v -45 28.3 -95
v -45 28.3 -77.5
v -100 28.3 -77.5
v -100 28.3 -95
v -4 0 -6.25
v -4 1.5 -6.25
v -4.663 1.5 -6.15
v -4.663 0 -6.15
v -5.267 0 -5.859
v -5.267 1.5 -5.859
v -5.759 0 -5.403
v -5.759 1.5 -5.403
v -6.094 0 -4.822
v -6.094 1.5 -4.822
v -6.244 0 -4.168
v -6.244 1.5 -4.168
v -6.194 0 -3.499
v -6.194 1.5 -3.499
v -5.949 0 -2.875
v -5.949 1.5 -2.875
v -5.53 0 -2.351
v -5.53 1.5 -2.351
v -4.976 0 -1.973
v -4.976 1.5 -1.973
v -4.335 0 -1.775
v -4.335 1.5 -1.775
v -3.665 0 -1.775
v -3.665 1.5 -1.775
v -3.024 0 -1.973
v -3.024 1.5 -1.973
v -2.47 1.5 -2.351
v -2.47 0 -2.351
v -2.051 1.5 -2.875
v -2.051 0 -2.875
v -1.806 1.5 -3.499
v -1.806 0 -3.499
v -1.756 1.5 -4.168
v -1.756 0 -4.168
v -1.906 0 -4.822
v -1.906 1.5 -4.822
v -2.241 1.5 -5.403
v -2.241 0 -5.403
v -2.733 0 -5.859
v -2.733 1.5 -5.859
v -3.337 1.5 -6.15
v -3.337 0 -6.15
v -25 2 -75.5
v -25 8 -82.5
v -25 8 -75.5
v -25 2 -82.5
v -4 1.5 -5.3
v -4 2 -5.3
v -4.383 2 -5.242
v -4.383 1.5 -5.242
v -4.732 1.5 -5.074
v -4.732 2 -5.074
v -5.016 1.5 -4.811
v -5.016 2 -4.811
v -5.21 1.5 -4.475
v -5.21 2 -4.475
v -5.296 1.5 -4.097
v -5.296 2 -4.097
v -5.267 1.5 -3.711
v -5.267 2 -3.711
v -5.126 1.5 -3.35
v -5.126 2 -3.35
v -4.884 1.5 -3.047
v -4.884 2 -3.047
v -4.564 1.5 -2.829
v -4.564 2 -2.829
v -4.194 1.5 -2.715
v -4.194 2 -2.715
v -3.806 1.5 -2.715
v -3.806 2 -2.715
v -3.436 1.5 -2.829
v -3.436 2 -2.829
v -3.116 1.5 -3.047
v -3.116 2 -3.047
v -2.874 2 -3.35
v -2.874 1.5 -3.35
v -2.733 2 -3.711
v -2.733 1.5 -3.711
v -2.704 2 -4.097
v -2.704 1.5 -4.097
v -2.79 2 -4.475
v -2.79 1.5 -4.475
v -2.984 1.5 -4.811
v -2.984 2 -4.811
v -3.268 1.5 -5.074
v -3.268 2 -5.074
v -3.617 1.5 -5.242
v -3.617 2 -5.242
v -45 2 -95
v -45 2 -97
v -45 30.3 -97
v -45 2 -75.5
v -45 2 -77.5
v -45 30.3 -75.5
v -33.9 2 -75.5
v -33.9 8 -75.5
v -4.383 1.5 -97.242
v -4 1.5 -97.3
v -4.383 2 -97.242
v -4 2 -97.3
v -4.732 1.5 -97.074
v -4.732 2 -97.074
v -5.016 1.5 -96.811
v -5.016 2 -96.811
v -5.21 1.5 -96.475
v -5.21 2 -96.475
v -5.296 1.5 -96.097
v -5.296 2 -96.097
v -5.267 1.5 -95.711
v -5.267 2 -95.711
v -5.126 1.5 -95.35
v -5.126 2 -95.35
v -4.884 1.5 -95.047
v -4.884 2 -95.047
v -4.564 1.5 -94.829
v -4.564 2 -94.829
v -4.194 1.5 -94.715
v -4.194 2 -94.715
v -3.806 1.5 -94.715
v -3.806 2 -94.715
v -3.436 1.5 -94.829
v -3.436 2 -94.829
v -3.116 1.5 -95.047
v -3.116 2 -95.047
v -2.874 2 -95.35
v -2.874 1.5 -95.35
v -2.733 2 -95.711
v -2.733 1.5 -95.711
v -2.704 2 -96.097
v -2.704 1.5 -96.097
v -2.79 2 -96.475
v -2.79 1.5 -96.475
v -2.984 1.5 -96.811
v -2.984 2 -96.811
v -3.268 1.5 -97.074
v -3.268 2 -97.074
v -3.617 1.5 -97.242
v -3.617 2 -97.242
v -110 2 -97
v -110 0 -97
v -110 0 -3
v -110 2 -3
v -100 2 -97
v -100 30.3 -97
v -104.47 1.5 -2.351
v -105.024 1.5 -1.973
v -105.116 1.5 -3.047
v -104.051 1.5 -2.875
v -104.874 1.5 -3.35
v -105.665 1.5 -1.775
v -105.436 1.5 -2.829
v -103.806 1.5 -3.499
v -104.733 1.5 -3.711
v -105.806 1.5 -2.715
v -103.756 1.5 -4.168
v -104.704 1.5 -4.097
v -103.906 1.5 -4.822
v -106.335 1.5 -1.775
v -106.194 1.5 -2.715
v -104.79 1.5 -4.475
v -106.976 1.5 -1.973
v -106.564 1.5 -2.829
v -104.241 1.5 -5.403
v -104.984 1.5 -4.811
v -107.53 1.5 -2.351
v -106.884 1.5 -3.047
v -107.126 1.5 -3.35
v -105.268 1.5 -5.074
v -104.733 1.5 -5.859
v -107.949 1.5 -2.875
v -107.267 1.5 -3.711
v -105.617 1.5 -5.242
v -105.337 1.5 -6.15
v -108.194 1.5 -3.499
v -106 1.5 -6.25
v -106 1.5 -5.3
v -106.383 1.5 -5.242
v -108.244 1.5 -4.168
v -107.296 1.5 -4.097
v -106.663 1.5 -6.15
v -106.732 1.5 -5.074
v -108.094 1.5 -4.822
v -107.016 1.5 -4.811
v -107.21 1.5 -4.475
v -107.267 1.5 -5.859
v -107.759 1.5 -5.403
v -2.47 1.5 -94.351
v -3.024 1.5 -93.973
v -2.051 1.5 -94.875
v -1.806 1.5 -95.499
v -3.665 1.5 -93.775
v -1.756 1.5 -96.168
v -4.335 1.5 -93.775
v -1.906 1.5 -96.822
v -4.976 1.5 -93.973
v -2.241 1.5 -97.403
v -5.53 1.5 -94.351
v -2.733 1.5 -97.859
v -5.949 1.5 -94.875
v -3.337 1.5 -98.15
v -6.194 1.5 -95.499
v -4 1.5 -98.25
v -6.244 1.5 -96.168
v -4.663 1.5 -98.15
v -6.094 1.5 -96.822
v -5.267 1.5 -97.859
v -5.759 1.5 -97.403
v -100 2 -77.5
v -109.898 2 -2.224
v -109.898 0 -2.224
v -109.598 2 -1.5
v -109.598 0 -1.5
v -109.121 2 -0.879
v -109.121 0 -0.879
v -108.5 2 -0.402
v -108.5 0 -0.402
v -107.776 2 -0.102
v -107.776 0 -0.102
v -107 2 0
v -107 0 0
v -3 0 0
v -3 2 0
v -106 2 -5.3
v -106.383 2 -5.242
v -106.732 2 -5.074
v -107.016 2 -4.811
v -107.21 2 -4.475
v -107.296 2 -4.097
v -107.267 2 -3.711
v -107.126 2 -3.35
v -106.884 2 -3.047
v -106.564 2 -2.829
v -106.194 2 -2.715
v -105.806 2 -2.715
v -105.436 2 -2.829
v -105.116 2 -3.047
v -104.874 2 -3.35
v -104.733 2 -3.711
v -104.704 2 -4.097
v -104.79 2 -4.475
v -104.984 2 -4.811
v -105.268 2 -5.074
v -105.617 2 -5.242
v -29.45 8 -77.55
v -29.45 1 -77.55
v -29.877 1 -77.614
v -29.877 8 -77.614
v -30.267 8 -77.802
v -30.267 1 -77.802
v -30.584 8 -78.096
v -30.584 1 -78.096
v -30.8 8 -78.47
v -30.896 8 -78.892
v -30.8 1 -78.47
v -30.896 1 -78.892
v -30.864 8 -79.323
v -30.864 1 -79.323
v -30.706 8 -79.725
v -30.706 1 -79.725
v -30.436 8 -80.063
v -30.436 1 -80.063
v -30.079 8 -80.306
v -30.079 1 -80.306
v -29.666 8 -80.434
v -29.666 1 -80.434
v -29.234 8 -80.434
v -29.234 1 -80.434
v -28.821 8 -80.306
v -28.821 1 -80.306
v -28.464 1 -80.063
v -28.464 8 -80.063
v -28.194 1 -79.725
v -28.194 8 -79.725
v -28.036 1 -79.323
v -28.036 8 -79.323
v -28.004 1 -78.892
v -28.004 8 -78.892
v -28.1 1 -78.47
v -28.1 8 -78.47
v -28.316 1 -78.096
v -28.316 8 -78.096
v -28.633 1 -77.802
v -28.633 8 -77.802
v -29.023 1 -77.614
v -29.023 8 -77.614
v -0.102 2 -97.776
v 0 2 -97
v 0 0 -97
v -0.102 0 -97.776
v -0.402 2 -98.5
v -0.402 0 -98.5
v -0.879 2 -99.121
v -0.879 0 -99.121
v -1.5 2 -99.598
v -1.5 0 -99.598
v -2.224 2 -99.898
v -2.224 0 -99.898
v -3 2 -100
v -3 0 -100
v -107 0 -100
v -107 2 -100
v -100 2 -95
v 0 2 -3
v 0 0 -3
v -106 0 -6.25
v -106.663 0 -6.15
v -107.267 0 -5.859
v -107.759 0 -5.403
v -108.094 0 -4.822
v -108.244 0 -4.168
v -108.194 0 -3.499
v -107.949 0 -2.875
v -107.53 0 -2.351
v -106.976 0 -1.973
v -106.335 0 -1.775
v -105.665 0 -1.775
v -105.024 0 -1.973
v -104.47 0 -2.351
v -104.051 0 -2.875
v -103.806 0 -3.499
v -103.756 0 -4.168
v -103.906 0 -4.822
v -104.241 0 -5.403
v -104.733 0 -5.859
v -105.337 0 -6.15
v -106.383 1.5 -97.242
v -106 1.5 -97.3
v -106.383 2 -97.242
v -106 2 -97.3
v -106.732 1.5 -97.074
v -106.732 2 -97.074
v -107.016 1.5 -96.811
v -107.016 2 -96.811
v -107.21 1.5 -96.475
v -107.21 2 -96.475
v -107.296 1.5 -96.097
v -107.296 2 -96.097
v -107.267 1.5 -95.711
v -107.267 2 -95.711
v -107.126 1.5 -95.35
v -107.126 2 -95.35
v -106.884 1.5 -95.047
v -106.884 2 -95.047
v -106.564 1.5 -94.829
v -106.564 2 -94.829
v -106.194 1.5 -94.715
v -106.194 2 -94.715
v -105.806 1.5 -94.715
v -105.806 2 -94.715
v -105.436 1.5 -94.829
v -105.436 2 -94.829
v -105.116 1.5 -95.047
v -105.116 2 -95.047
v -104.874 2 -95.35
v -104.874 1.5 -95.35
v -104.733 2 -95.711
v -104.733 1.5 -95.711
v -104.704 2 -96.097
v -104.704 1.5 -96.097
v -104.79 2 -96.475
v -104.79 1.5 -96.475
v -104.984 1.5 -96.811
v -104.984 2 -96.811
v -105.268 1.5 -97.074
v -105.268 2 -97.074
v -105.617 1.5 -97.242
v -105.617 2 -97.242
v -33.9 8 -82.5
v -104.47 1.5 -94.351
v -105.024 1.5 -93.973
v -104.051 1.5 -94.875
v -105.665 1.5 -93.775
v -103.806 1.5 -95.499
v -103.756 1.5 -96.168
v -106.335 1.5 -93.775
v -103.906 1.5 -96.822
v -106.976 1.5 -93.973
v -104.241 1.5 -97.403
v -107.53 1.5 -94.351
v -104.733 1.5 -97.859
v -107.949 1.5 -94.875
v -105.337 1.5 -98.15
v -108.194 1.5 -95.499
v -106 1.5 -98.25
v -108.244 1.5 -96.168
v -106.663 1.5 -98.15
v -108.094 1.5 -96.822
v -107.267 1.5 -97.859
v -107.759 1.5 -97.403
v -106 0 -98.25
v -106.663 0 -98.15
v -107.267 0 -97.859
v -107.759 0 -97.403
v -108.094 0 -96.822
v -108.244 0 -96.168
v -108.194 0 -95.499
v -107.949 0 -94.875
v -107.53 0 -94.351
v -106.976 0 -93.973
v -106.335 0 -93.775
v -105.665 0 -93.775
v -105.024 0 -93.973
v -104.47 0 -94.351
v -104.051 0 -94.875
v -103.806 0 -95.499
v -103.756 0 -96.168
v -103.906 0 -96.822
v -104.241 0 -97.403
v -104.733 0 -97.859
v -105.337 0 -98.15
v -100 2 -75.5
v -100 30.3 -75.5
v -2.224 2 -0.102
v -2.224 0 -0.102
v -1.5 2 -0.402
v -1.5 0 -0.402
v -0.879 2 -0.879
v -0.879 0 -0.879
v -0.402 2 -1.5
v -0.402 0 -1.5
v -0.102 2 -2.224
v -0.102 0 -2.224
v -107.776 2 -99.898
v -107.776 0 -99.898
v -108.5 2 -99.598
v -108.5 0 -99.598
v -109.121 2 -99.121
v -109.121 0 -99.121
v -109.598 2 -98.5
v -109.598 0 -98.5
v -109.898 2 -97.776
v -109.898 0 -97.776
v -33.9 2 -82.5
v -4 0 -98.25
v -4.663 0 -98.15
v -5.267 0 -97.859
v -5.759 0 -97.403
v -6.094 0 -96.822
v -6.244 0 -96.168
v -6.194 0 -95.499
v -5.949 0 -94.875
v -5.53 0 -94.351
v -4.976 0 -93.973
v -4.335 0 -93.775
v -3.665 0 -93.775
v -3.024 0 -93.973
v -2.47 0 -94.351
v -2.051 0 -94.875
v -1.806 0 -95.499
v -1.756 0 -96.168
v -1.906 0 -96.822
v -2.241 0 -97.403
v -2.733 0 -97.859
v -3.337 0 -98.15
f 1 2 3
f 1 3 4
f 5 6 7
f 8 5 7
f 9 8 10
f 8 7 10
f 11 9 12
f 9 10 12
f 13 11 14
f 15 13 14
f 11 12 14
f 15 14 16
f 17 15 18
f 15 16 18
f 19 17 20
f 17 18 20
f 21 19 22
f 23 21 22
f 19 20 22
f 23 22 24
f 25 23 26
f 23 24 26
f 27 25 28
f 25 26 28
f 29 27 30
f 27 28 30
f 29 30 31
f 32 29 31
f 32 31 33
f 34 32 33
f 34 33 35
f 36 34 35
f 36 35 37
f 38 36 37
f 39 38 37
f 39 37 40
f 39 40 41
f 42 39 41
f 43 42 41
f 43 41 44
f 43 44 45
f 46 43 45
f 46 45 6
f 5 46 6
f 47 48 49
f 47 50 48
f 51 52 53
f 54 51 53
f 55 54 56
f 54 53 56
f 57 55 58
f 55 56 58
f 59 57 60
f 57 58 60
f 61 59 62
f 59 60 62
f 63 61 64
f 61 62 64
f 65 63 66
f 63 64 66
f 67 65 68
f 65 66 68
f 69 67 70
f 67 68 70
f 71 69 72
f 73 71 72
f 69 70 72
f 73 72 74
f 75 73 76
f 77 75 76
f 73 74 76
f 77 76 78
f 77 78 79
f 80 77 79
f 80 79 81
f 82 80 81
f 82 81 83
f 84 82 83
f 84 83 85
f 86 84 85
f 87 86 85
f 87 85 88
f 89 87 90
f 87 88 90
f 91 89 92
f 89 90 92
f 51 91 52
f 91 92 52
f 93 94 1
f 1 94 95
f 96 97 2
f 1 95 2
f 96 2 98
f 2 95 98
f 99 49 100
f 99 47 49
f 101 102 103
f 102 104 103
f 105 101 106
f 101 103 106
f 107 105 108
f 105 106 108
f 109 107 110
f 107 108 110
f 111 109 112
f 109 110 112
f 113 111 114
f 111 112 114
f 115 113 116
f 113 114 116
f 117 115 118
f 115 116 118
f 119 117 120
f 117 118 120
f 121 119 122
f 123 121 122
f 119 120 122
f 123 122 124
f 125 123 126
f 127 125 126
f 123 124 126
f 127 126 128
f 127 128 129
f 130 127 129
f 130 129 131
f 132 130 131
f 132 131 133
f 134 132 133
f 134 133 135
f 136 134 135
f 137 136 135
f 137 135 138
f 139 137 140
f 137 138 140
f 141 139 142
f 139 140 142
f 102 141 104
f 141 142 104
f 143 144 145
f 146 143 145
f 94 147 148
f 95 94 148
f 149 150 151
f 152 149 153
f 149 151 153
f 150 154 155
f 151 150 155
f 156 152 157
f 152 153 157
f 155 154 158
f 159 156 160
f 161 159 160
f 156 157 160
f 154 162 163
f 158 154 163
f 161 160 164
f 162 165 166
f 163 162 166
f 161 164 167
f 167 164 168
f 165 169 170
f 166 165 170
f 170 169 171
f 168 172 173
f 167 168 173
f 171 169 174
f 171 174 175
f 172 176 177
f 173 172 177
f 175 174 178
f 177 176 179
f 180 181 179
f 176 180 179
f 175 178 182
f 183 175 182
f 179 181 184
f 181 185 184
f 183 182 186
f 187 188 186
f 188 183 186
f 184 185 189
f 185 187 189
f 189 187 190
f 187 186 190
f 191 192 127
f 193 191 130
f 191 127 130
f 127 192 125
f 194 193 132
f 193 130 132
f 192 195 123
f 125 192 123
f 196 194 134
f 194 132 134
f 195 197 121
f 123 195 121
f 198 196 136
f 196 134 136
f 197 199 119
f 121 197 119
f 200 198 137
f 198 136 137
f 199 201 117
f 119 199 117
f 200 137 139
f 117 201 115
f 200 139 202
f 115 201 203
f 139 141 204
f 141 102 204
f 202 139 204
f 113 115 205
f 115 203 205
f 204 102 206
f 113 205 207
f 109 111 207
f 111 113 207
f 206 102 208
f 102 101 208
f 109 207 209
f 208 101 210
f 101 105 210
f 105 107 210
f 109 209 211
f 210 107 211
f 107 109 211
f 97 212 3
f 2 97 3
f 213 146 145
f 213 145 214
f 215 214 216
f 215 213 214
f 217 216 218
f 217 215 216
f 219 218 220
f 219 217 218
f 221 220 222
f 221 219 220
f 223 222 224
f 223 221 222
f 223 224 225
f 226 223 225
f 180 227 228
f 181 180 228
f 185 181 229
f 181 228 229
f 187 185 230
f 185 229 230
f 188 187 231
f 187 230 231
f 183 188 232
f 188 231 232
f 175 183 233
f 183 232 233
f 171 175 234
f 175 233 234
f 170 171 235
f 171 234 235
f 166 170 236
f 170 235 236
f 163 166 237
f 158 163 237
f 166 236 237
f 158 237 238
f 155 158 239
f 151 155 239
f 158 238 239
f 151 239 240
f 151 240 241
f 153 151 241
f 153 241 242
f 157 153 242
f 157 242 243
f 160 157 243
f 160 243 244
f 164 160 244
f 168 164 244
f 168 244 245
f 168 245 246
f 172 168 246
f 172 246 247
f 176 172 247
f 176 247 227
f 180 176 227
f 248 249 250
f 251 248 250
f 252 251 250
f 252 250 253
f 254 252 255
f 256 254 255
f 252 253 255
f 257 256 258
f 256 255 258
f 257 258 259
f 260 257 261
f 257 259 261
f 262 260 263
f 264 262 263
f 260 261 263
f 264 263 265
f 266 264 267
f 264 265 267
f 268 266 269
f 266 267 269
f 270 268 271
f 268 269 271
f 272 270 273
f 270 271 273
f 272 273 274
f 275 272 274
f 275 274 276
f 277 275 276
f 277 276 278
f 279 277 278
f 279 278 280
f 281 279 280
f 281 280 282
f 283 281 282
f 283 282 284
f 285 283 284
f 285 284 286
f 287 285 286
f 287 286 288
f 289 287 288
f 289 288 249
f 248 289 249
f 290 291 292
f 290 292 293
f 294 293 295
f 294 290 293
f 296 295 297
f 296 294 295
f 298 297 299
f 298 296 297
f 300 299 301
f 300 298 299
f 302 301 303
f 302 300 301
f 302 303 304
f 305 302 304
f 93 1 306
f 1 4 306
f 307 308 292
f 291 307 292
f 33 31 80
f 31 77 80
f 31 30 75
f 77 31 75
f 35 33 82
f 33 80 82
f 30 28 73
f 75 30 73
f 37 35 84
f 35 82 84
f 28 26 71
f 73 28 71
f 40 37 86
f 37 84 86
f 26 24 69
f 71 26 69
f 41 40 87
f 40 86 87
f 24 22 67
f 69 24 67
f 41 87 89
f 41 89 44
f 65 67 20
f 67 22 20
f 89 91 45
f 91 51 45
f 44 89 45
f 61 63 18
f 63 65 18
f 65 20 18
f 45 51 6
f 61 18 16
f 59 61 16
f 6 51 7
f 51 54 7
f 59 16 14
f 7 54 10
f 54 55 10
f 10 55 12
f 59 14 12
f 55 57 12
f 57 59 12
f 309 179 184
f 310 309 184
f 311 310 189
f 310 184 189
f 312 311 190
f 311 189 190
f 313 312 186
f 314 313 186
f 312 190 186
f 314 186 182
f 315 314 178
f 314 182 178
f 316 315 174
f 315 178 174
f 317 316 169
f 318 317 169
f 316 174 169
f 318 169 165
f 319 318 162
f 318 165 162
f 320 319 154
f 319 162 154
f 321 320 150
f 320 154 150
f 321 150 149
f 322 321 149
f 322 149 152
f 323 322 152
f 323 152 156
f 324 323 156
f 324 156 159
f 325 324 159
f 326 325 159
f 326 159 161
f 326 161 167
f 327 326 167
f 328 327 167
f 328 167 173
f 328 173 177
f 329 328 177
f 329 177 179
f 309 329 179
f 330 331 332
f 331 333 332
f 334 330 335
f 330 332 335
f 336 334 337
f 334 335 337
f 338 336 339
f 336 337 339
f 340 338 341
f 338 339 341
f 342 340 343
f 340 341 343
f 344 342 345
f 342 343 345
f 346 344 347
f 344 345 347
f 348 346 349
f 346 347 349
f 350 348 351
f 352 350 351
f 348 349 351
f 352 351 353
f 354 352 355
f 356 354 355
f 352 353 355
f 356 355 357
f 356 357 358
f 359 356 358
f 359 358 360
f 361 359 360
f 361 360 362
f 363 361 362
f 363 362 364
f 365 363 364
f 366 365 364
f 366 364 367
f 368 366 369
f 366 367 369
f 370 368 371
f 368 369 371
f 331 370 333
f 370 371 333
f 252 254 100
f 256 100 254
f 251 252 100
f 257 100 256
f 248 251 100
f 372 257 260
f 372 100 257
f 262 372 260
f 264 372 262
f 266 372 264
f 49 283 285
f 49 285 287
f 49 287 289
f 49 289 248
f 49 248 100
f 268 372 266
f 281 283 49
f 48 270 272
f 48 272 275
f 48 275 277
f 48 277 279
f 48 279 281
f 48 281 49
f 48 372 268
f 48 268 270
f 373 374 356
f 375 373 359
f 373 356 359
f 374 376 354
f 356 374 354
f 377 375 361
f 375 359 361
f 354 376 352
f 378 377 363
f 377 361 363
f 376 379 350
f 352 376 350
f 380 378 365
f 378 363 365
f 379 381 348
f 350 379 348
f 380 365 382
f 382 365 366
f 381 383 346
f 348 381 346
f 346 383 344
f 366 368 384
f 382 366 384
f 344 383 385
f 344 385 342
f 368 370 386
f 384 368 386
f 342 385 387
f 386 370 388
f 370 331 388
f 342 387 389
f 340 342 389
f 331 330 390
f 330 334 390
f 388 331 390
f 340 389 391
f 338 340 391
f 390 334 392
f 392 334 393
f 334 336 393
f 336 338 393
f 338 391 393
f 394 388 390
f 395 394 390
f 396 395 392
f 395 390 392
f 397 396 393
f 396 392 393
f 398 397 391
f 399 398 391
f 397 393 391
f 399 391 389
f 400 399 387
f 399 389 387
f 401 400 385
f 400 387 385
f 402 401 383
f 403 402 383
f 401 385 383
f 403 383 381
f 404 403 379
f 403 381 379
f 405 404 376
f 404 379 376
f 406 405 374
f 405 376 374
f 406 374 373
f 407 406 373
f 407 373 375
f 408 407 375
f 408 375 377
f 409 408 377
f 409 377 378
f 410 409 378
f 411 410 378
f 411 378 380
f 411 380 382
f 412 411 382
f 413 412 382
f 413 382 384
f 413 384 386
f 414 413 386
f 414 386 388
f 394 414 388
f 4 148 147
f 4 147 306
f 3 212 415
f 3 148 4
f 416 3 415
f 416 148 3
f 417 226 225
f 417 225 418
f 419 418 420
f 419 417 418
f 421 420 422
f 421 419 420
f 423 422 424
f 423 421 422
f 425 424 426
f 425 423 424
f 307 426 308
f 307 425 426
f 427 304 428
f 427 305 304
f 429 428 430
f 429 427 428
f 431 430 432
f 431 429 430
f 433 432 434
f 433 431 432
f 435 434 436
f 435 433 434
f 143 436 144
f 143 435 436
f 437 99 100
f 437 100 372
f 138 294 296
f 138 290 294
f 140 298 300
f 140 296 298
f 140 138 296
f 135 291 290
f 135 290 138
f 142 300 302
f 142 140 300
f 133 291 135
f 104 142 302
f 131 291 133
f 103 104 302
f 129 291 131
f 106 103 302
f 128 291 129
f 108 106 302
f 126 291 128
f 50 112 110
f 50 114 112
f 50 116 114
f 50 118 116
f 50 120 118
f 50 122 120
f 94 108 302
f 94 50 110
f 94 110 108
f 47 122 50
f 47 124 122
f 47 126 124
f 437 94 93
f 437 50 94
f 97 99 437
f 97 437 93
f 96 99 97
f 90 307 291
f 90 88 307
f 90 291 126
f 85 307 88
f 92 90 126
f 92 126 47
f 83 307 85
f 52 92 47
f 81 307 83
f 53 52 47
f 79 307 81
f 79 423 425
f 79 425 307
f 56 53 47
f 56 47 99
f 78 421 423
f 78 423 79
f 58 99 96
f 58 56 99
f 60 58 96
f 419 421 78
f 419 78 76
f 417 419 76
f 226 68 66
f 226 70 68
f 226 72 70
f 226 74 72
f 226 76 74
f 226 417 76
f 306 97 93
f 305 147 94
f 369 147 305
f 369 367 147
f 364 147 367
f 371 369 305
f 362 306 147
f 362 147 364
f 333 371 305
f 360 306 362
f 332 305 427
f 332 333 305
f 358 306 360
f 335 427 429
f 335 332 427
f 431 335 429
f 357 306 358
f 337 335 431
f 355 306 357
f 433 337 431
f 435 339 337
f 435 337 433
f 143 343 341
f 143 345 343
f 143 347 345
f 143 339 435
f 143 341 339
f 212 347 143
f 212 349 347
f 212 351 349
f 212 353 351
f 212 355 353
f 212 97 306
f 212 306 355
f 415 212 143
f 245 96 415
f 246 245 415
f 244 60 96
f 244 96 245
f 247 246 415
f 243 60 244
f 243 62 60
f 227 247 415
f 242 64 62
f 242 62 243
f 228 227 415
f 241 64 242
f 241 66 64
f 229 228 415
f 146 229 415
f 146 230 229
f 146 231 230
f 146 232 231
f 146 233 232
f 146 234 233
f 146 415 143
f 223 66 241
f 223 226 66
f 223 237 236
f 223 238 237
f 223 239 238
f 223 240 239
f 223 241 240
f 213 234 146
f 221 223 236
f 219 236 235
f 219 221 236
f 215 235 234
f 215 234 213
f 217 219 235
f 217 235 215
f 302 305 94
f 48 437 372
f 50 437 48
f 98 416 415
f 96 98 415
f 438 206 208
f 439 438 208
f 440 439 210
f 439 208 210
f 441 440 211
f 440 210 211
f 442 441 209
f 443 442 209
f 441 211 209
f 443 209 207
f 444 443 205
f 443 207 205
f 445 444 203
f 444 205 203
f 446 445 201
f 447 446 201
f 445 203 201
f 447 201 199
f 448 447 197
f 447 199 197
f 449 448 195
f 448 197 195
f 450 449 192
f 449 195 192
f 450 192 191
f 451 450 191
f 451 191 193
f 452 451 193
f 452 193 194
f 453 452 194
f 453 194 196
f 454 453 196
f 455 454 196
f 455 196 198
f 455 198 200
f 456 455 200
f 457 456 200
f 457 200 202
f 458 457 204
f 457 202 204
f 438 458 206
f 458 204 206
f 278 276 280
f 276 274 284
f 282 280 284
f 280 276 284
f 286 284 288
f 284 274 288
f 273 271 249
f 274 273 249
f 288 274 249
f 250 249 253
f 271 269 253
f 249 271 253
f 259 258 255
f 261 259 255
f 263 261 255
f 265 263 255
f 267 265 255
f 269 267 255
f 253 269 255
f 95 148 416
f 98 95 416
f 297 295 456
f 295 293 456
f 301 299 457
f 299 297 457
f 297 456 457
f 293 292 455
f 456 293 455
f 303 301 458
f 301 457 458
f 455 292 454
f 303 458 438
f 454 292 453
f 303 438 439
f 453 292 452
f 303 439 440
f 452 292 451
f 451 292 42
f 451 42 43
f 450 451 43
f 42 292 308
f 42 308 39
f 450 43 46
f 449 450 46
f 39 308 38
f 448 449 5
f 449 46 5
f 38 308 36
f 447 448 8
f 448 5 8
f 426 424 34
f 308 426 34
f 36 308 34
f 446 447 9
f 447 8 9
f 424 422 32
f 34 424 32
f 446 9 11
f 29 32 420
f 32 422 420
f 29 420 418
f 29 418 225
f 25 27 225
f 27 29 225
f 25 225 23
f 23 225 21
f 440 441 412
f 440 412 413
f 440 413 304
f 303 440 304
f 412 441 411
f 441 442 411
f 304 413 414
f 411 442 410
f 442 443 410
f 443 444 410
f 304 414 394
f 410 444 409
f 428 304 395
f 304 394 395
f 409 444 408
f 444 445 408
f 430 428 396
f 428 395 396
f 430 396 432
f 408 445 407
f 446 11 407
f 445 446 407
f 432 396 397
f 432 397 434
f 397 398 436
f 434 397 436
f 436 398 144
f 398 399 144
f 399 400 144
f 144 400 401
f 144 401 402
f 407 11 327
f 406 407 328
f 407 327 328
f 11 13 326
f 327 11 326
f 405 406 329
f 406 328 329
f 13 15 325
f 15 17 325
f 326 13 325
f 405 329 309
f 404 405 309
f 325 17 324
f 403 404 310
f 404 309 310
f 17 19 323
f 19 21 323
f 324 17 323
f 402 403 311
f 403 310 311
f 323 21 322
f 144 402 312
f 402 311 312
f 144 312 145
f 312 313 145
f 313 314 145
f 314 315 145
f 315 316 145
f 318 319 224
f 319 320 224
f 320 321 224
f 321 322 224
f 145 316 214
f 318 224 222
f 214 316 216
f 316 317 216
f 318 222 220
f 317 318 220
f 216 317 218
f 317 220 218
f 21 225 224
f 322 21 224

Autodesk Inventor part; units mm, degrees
ref_plane "YZ Plane" through (0, 0, 0) normal (1, 0, 0) x (0, 1, 0)
ref_plane "XZ Plane" through (0, 0, 0) normal (0, 1, 0) x (-1, 0, 0)
sketch "Szkic1" plane through (0, 0, 0) normal (0, 1, 0) x (-1, 0, 0)
  line L0 (110, 0) -> (0, 0)
  line L1 (0, 0) -> (0, -100)
  line L2 (0, -100) -> (110, -100)
  line L3 (110, -100) -> (110, 0)
  dimension "d0" = 100
  dimension "d1" = 110
extrude "Gabaryt" add sketch "Szkic1" along normal blind 2
sketch "Szkic2" plane through (0, 0, 0) normal (0, 1, 0) x (1, 0, 0)
  line L0 (0, 0) -> (0, 100) projected
  line L1 (-110, 0) -> (0, 0) projected
  line L2 (-110, 100) -> (-110, 0) projected
  line L3 (0, 100) -> (-110, 100) projected
  line L4 (-110, 50) -> (0, 50)
  line L5 (-55, 100) -> (-55, 0)
  point P0 (-4, 4)
  point P1 (-106, 4)
  point P2 (-4, 96)
  point P3 (-106, 96)
  dimension "d4" = 4
  dimension "d5" = 4
hole "Otwory montażowe" at (-4, 0, -4) at (-106, 0, -4) at (-106, 0, -96) at (-4, 0, -96) direction (0, 1, 0) diameter 2.6 end through all counterbore diameter 4.5 counterbore depth 1.5
fillet "Zaokrąglenie1" radius 3 4 edges at (0, 1, 0) (-110, 1, 0) (-110, 1, -100) (0, 1, -100)
ref_plane "Płaszczyzna konstrukcyjna2" through (-100, 0, -97) normal (-1, 0, 0) x (0, 0, 1)
sketch "Szkic4" plane through (-100, 0, -97) normal (-1, 0, 0) x (0, 0, 1)
  line L0 (0, 2) -> (94, 2) projected
  line L1 (0, 28.3) -> (2, 28.3)
  line L2 (2, 28.3) -> (2, 2)
  line L3 (2, 2) -> (0, 2)
  line L4 (0, 2) -> (0, 28.3)
  line L5 (19.5, 28.3) -> (21.5, 28.3)
  line L6 (21.5, 28.3) -> (21.5, 2)
  line L7 (21.5, 2) -> (19.5, 2)
  line L8 (19.5, 2) -> (19.5, 28.3)
  line L9 (0, 30.3) -> (21.5, 30.3)
  line L10 (21.5, 30.3) -> (21.5, 28.3)
  line L11 (21.5, 28.3) -> (0, 28.3)
  line L12 (0, 28.3) -> (0, 30.3)
  line L13 (-3, 2) -> (-3, 0) projected
  point P0 (97, 0)
  point P1 (2, 2)
  point P2 (2, 28.3)
  point P3 (19.5, 2)
  point P4 (21.5, 2)
  dimension "d20" = 2
  dimension "d21" = 2
  dimension "d22" = 2
  dimension "d23" = 17.5
  dimension "d24" = 26.3
  dimension "d25" = 3
extrude "Wyciągnięcie proste3" add sketch "Szkic4" against normal blind 55 contours L4 L1 L2 L0 | L12 L9 L10 L5 L11 L1 | L8 L5 L6 L0
sketch "Szkic5" plane through (0, 2, 0) normal (0, 1, 0) x (1, 0, 0)
  line L0 (-33.9, 82.5) -> (-25, 82.5)
  line L1 (-25, 82.5) -> (-25, 75.5)
  line L2 (-25, 75.5) -> (-33.9, 75.5)
  line L3 (-33.9, 75.5) -> (-33.9, 82.5)
  line L4 (-100, 75.5) -> (-45, 75.5) projected
  line L5 (-110, 97) -> (-110, 3) projected
  line L6 (0, 3) -> (0, 97) projected
  point P0 (0, 0)
  point P1 (-29.45, 82.5)
  dimension "d28" = 7
  dimension "d29" = 8.9
  dimension "d34" = 25
extrude "Wyciągnięcie proste4" add sketch "Szkic5" along normal blind 6
sketch "Szkic6" plane through (0, 8, 0) normal (0, 1, 0) x (1, 0, 0)
  line L0 (-25, 82.5) -> (-33.9, 82.5) projected
  line L1 (-33.9, 82.5) -> (-33.9, 75.5) projected
  line L2 (-33.9, 75.5) -> (-25, 75.5) projected
  line L3 (-25, 75.5) -> (-25, 82.5) projected
  line L4 (-33.9, 75.5) -> (-33.9, 82.5) projected
  line L5 (-33.9, 79) -> (-25, 79)
  line L6 (-29.45, 82.5) -> (-29.45, 75.5)
  point P0 (0, 0)
  point P1 (-29.45, 79)
hole "Otwór2" at (-29.45, 8, -79) direction (0, -1, 0) diameter 2.9 depth 7
equation "\"d0\" = podstawa_a"
equation "\"d1\" = podstawa_b"
equation "\"d2\" = podstawa_wys"
equation "\"d4\" = podstawa_otwory_montazowe_poz_x"
equation "\"d5\" = podstawa_otwory_montazowe_poz_y"
equation "\"d6\" = gniazdo_M2_D2"
equation "\"d8\" = gniazdo_M2_D1"
equation "\"d9\" = gniazdo_M2_glebokosc"
equation "\"d13\" = podstawa_zaokraglenie"
equation "\"d20\" = obudowa_uchwyt_grubosc"
equation "\"d21\" = d20"
equation "\"d22\" = d20"
equation "\"d23\" = obudowa_uchwyt_szerokosc_wew"
equation "\"d24\" = obudowa_uchwyt_wysokosc_wew"
equation "\"d25\" = obudowa_uchwyt_poz_z"
equation "\"d26\" = obudowa_uchwyt_kolnierz_wys"
equation "\"d28\" = podstawa_mocowanie_DC_a"
equation "\"d29\" = podstawa_mocowanie_DC_b"
equation "\"d34\" = obudowa_gniazdo_poz"
equation "\"d32\" = podstawa_mocowanie_DC_wys"
equation "\"d35\" = insert_D"
equation "\"d37\" = gniazdo_M2_D1"
equation "\"d38\" = gniazdo_M2_glebokosc"
equation "\"d40\" = insert_glebokosc"
equation "\"podstawa_a\" = 100"
equation "\"podstawa_b\" = 110"
equation "\"podstawa_wys\" = 2"
equation "\"podstawa_otwory_montazowe_poz_y\" = 4"
equation "\"podstawa_otwory_montazowe_poz_x\" = 4"
equation "\"gniazdo_M2_D1\" = 4.5"
equation "\"gniazdo_M2_glebokosc\" = 1.5"
equation "\"gniazdo_M2_D2\" = 2.6"
equation "\"obudowa_wys\" = 45"
equation "\"obudowa_grubosc\" = 2"
equation "\"obudowa_prowadnica_odsuniecie\" = 2"
equation "\"obudowa_prowadnica_grubosc\" = 2"
equation "\"obudowa_kontrolki_a\" = 38"
equation "\"obudowa_prowadnica_wys\" = 19"
equation "\"obudowa_otwory_montazowe_poz_y\" = 4"
equation "\"obudowa_otwory_montazowe_poz_x\" = 4"
equation "\"obudowa_otwory_montazowe_material_y\" = 8"
equation "\"obudowa_otwory_montazowe_material_x\" = 8"
equation "\"insert_D\" = 2.9"
equation "\"insert_glebokosc\" = 7"
equation "\"obudowa_zaokraglenie\" = 3"
equation "\"podstawa_zaokraglenie\" = 3"
equation "\"obudowa_otwory_io_wys\" = 15"
equation "\"obudowa_otwory_io_D\" = 15"
equation "\"obudowa_otwory_io1_poz\" = 55"
equation "\"obudowa_otwory_io1_wys\" = 25"
equation "\"obudowa_otwory_io1_D\" = 12"
equation "\"obudowa_otwory_io2_poz\" = 38"
equation "\"obudowa_otwory_io2_wys\" = 25"
equation "\"obudowa_otwory_io2_D\" = 12"
equation "\"obudowa_otwory_pot_D\" = 7.2"
equation "\"input_b\" = 14.4"
equation "\"input_wys\" = 10.9"
equation "\"input_a\" = 8.9"
equation "\"obudowa_MTS_otwor_D\" = 6.2"
equation "\"obudowa_pot_poz_y\" = 15"
equation "\"obudowa_s_poz_x\" = 78"
equation "\"obudowa_s_D\" = 6.2"
equation "\"obudowa_s_poz_y\" = 15"
equation "\"obudowa_s_rozstaw_y\" = 16"
equation "\"pcb_rozstaw_x\" = 92"
equation "\"pcb_rozstaw_y\" = 58"
equation "\"obudowa_pcb_grubosc_scianki\" = 6"
equation "\"pcb_grubosc_scianki\" = 6"
equation "\"pcb_poz_y\" = 29"
equation "\"pcb_wys_bloku\" = 35"
equation "\"obudowa_footswitch_poz_y\" = 68"
equation "\"obudowa_footswitch_poz_x\" = 35"
equation "\"obudowa_footswitch_D\" = 12.3"
equation "\"obudowa_led_indicator_D\" = 3.5"
equation "\"obudowa_led_indicator_poz_x\" = 55"
equation "\"obudowa_podkladka_otwory\" = 4"
equation "\"podstawa_uchwyt_grubosc\" = 3"
equation "\"podstawa_uchwyt_wysokosc\" = 15"
equation "\"obudowa_uchwyt_grubosc\" = 2"
equation "\"pbudowa_uchwyt_podciecie_wys\" = 1.5"
equation "\"obudowa_uchwyt_wysokosc_wew\" = 26.3"
equation "\"obudowa_uchwyt_szerokosc_wew\" = 17.5"
equation "\"obudowa_gniazdo_poz\" = 25"
equation "\"obudowa_uchwyt_kolnierz_wys\" = 55"
equation "\"obudowa_uchwyt_poz_y\" = 2"
equation "\"obudowa_uchwyt_poz_z\" = 3"
equation "\"obudowa_podciecie_inout_wys\" = 6"
equation "\"obudowa_podciecie_logo_wys\" = 34"
equation "\"obudowa_podciecie_logo_szerokosc\" = 25"
equation "\"obudowa_pot_pozycjonowanie_wys\" = 13"
equation "\"obudowa_pot_pozycjonowanie_szerokosc\" = 2.8"
equation "\"obudowa_pot_pozycjonowanie_glebokosc\" = 1.4"
equation "\"obudowa_led_mocowanie_wys\" = 6"
equation "\"obudowa_led_mocowanie_poz\" = 46"
equation "\"obudowa_led_mocowanie_D\" = 5.5"
equation "\"obudowa_led_mocowanie_grubosc\" = 8"
equation "\"holder_led_grubosc\" = 2.5"
equation "\"holder_led_dlugosc\" = 28"
equation "\"holder_led_uchwyt_D\" = 5"
equation "\"holder_led_uchwyt_wysokosc\" = 5"
equation "\"holder_led_uchwyt_szerokosc\" = 8"
equation "\"holder_gniazdo_b\" = 5"
equation "\"holder_gniazdo_grubosc\" = 2.5"
equation "\"holder_gniazdo_a\" = 28"
equation "\"podstawa_mocowanie_DC_a\" = 7"
equation "\"podstawa_mocowanie_DC_b\" = 8.9"
equation "\"podstawa_mocowanie_DC_wys\" = 6"
equation "\"holder_gniazdo_odleglosc_miedzy_ramionami\" = 9.2"
equation "\"holder_gniazdo_grubosc_ramion\" = 1.5"
equation "\"holder_gniazdo_wys\" = 8"
equation "\"holder_gniazdo_uchwyt_poz\" = 5"
properties part number "podstawa"
